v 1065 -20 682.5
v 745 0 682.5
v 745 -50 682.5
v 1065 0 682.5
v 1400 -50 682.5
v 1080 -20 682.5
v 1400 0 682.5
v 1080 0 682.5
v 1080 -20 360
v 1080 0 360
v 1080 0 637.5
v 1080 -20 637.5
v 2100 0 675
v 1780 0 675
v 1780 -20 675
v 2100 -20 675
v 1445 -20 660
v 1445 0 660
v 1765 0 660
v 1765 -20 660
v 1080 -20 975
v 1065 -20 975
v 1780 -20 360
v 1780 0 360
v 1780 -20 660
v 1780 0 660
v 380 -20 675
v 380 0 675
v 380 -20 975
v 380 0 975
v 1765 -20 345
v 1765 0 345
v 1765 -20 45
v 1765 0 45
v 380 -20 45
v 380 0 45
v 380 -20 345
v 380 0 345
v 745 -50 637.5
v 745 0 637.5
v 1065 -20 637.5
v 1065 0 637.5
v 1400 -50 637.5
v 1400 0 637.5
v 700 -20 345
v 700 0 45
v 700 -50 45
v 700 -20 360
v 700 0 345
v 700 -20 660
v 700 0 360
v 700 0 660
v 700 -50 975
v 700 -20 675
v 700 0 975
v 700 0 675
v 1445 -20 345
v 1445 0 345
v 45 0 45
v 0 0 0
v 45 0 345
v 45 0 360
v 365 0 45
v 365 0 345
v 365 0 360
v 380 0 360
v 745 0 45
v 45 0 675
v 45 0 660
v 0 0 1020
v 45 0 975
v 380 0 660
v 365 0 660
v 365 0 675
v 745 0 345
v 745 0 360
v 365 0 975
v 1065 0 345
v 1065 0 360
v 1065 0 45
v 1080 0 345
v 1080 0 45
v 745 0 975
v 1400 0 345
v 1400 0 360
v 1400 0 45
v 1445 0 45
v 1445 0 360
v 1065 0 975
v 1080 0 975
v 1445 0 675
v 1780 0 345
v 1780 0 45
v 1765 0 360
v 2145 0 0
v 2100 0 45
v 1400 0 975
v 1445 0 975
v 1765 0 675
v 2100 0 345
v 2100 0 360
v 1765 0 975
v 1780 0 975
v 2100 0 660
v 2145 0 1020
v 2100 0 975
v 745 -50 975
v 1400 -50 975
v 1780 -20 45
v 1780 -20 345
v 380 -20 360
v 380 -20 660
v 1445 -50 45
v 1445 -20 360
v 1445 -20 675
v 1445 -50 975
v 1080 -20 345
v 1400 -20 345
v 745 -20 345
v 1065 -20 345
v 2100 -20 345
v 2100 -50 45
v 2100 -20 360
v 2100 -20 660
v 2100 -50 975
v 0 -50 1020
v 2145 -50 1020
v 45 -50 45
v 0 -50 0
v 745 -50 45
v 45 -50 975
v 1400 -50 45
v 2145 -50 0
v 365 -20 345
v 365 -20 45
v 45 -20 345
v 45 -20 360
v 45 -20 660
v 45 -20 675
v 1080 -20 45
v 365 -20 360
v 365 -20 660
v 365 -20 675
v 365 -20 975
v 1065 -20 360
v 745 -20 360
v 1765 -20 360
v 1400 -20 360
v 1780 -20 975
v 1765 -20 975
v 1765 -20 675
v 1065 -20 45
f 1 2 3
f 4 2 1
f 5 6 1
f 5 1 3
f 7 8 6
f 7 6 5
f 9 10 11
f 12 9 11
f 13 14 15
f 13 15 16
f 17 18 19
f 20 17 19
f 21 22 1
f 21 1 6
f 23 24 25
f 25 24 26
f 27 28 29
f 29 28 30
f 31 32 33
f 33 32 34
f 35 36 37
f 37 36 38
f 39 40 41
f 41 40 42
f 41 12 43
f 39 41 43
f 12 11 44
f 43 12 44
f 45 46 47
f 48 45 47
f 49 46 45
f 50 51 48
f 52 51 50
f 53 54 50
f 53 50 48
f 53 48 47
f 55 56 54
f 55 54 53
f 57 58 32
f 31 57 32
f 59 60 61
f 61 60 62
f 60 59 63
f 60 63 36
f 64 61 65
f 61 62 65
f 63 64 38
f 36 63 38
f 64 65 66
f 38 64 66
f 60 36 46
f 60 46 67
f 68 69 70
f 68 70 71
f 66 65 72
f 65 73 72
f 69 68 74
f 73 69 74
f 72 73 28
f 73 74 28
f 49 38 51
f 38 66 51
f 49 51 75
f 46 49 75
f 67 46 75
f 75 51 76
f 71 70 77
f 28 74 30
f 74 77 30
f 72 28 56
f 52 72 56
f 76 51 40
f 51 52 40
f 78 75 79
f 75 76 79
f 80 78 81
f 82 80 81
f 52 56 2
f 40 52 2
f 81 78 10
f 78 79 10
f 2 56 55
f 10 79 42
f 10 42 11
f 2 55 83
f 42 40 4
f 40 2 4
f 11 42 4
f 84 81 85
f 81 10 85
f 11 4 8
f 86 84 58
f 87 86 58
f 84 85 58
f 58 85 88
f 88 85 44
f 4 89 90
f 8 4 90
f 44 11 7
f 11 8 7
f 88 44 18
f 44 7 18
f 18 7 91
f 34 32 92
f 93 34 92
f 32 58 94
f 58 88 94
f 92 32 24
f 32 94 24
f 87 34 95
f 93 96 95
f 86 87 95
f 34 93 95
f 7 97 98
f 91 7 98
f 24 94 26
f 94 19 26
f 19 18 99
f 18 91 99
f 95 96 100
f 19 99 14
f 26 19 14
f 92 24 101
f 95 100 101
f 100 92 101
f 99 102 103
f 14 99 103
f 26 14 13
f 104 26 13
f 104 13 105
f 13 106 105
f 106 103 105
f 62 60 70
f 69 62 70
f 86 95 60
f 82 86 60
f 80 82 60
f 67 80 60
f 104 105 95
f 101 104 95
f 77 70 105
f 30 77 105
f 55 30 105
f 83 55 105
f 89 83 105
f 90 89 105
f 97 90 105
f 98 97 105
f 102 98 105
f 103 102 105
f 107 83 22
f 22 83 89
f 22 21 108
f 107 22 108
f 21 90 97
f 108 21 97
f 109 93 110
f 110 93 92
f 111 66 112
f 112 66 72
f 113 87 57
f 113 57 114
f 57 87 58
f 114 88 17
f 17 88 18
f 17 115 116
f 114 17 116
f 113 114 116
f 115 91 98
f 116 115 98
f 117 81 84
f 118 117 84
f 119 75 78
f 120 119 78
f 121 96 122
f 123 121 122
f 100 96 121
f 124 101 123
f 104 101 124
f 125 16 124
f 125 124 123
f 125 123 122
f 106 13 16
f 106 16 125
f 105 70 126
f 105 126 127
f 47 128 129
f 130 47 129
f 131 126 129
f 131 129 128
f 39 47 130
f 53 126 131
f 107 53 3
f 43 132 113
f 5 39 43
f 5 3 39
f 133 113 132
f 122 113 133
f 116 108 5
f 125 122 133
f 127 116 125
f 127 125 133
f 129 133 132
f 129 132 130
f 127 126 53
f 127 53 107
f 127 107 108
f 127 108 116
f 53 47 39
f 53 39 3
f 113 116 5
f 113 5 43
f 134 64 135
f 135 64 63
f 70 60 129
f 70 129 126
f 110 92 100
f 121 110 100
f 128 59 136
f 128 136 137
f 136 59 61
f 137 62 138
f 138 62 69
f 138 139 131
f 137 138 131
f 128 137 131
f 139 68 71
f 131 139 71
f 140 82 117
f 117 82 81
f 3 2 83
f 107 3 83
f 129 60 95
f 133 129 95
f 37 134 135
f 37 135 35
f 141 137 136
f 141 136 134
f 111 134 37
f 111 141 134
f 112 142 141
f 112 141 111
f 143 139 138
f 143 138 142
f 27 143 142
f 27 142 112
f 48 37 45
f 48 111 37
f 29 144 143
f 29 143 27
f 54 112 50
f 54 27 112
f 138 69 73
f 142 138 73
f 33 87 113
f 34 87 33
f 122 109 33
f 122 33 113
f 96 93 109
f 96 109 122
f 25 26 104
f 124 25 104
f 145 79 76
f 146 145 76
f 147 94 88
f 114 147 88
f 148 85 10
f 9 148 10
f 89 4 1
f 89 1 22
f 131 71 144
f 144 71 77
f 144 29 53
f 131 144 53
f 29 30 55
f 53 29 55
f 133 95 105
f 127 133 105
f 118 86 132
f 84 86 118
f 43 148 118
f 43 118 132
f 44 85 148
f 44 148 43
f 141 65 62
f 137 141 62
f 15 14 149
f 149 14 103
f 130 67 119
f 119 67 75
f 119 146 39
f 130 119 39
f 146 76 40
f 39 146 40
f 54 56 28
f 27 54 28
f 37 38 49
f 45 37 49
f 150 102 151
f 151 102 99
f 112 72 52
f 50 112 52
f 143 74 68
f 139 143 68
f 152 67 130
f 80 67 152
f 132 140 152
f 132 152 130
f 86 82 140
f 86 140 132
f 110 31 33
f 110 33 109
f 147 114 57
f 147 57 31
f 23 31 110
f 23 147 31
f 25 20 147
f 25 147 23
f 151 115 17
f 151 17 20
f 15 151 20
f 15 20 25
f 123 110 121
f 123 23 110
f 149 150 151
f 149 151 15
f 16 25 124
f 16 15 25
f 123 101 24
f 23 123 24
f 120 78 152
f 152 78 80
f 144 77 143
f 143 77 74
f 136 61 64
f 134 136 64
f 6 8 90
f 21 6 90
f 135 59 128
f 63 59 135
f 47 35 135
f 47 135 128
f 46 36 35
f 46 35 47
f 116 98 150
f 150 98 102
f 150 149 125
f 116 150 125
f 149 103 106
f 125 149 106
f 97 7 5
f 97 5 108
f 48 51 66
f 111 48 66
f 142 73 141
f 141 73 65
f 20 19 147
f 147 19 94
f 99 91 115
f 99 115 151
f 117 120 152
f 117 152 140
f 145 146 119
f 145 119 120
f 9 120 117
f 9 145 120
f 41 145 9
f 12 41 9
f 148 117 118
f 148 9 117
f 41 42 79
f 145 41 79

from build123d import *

# Parameters (mm, degrees)
F0_W     = 2145
F0_H     = 1020
F0_W_2   = 655
F0_H_2   = 592.5
F0_H_3   = 930
F0_H_4   = 292.5
F1_DEPTH = 50
F2_W     = 320
F2_H     = 15
F2_W_2   = 15
F2_H_2   = 292.5
F3_DEPTH = 20


with BuildPart() as f1:
    # F0 (on Front) → F1 (new body)
    with BuildSketch(Plane.XZ):
        with Locations((1072.5, 510)):
            Rectangle(F0_W, F0_H)
        with Locations((1072.5, 341.25)):
            Rectangle(F0_W_2, F0_H_2, mode=Mode.SUBTRACT)
        with Locations((372.5, 510)):
            Rectangle(F0_W_2, F0_H_3, mode=Mode.SUBTRACT)
        with Locations((1772.5, 510)):
            Rectangle(F0_W_2, F0_H_3, mode=Mode.SUBTRACT)
        with Locations((1072.5, 828.75)):
            Rectangle(F0_W_2, F0_H_4, mode=Mode.SUBTRACT)
    extrude(amount=F1_DEPTH)

    # F2 (on Front) → F3 (join)
    with BuildSketch(Plane.XZ):
        Polygon((1780, 975), (1765, 975), (1765, 675), (1765, 660), (1765, 360), (1445, 360), (1445, 345), (1765, 345), (1765, 45), (1780, 45), (1780, 345), (2100, 345), (2100, 360), (1780, 360), (1780, 660), (1780, 675), align=None)
        with Locations((1605, 667.5)):
            Rectangle(F2_W, F2_H)
        with Locations((1940, 667.5)):
            Rectangle(F2_W, F2_H)
        with Locations((1072.5, 828.75)):
            Rectangle(F2_W_2, F2_H_2)
        Polygon((1080, 637.5), (1065, 637.5), (1065, 360), (745, 360), (745, 345), (1065, 345), (1065, 45), (1080, 45), (1080, 345), (1400, 345), (1400, 360), (1080, 360), align=None)
        Polygon((380, 975), (365, 975), (365, 675), (45, 675), (45, 660), (365, 660), (365, 360), (45, 360), (45, 345), (365, 345), (365, 45), (380, 45), (380, 345), (700, 345), (700, 360), (380, 360), (380, 660), (700, 660), (700, 675), (380, 675), align=None)
    extrude(amount=F3_DEPTH)


solid = f1.part
